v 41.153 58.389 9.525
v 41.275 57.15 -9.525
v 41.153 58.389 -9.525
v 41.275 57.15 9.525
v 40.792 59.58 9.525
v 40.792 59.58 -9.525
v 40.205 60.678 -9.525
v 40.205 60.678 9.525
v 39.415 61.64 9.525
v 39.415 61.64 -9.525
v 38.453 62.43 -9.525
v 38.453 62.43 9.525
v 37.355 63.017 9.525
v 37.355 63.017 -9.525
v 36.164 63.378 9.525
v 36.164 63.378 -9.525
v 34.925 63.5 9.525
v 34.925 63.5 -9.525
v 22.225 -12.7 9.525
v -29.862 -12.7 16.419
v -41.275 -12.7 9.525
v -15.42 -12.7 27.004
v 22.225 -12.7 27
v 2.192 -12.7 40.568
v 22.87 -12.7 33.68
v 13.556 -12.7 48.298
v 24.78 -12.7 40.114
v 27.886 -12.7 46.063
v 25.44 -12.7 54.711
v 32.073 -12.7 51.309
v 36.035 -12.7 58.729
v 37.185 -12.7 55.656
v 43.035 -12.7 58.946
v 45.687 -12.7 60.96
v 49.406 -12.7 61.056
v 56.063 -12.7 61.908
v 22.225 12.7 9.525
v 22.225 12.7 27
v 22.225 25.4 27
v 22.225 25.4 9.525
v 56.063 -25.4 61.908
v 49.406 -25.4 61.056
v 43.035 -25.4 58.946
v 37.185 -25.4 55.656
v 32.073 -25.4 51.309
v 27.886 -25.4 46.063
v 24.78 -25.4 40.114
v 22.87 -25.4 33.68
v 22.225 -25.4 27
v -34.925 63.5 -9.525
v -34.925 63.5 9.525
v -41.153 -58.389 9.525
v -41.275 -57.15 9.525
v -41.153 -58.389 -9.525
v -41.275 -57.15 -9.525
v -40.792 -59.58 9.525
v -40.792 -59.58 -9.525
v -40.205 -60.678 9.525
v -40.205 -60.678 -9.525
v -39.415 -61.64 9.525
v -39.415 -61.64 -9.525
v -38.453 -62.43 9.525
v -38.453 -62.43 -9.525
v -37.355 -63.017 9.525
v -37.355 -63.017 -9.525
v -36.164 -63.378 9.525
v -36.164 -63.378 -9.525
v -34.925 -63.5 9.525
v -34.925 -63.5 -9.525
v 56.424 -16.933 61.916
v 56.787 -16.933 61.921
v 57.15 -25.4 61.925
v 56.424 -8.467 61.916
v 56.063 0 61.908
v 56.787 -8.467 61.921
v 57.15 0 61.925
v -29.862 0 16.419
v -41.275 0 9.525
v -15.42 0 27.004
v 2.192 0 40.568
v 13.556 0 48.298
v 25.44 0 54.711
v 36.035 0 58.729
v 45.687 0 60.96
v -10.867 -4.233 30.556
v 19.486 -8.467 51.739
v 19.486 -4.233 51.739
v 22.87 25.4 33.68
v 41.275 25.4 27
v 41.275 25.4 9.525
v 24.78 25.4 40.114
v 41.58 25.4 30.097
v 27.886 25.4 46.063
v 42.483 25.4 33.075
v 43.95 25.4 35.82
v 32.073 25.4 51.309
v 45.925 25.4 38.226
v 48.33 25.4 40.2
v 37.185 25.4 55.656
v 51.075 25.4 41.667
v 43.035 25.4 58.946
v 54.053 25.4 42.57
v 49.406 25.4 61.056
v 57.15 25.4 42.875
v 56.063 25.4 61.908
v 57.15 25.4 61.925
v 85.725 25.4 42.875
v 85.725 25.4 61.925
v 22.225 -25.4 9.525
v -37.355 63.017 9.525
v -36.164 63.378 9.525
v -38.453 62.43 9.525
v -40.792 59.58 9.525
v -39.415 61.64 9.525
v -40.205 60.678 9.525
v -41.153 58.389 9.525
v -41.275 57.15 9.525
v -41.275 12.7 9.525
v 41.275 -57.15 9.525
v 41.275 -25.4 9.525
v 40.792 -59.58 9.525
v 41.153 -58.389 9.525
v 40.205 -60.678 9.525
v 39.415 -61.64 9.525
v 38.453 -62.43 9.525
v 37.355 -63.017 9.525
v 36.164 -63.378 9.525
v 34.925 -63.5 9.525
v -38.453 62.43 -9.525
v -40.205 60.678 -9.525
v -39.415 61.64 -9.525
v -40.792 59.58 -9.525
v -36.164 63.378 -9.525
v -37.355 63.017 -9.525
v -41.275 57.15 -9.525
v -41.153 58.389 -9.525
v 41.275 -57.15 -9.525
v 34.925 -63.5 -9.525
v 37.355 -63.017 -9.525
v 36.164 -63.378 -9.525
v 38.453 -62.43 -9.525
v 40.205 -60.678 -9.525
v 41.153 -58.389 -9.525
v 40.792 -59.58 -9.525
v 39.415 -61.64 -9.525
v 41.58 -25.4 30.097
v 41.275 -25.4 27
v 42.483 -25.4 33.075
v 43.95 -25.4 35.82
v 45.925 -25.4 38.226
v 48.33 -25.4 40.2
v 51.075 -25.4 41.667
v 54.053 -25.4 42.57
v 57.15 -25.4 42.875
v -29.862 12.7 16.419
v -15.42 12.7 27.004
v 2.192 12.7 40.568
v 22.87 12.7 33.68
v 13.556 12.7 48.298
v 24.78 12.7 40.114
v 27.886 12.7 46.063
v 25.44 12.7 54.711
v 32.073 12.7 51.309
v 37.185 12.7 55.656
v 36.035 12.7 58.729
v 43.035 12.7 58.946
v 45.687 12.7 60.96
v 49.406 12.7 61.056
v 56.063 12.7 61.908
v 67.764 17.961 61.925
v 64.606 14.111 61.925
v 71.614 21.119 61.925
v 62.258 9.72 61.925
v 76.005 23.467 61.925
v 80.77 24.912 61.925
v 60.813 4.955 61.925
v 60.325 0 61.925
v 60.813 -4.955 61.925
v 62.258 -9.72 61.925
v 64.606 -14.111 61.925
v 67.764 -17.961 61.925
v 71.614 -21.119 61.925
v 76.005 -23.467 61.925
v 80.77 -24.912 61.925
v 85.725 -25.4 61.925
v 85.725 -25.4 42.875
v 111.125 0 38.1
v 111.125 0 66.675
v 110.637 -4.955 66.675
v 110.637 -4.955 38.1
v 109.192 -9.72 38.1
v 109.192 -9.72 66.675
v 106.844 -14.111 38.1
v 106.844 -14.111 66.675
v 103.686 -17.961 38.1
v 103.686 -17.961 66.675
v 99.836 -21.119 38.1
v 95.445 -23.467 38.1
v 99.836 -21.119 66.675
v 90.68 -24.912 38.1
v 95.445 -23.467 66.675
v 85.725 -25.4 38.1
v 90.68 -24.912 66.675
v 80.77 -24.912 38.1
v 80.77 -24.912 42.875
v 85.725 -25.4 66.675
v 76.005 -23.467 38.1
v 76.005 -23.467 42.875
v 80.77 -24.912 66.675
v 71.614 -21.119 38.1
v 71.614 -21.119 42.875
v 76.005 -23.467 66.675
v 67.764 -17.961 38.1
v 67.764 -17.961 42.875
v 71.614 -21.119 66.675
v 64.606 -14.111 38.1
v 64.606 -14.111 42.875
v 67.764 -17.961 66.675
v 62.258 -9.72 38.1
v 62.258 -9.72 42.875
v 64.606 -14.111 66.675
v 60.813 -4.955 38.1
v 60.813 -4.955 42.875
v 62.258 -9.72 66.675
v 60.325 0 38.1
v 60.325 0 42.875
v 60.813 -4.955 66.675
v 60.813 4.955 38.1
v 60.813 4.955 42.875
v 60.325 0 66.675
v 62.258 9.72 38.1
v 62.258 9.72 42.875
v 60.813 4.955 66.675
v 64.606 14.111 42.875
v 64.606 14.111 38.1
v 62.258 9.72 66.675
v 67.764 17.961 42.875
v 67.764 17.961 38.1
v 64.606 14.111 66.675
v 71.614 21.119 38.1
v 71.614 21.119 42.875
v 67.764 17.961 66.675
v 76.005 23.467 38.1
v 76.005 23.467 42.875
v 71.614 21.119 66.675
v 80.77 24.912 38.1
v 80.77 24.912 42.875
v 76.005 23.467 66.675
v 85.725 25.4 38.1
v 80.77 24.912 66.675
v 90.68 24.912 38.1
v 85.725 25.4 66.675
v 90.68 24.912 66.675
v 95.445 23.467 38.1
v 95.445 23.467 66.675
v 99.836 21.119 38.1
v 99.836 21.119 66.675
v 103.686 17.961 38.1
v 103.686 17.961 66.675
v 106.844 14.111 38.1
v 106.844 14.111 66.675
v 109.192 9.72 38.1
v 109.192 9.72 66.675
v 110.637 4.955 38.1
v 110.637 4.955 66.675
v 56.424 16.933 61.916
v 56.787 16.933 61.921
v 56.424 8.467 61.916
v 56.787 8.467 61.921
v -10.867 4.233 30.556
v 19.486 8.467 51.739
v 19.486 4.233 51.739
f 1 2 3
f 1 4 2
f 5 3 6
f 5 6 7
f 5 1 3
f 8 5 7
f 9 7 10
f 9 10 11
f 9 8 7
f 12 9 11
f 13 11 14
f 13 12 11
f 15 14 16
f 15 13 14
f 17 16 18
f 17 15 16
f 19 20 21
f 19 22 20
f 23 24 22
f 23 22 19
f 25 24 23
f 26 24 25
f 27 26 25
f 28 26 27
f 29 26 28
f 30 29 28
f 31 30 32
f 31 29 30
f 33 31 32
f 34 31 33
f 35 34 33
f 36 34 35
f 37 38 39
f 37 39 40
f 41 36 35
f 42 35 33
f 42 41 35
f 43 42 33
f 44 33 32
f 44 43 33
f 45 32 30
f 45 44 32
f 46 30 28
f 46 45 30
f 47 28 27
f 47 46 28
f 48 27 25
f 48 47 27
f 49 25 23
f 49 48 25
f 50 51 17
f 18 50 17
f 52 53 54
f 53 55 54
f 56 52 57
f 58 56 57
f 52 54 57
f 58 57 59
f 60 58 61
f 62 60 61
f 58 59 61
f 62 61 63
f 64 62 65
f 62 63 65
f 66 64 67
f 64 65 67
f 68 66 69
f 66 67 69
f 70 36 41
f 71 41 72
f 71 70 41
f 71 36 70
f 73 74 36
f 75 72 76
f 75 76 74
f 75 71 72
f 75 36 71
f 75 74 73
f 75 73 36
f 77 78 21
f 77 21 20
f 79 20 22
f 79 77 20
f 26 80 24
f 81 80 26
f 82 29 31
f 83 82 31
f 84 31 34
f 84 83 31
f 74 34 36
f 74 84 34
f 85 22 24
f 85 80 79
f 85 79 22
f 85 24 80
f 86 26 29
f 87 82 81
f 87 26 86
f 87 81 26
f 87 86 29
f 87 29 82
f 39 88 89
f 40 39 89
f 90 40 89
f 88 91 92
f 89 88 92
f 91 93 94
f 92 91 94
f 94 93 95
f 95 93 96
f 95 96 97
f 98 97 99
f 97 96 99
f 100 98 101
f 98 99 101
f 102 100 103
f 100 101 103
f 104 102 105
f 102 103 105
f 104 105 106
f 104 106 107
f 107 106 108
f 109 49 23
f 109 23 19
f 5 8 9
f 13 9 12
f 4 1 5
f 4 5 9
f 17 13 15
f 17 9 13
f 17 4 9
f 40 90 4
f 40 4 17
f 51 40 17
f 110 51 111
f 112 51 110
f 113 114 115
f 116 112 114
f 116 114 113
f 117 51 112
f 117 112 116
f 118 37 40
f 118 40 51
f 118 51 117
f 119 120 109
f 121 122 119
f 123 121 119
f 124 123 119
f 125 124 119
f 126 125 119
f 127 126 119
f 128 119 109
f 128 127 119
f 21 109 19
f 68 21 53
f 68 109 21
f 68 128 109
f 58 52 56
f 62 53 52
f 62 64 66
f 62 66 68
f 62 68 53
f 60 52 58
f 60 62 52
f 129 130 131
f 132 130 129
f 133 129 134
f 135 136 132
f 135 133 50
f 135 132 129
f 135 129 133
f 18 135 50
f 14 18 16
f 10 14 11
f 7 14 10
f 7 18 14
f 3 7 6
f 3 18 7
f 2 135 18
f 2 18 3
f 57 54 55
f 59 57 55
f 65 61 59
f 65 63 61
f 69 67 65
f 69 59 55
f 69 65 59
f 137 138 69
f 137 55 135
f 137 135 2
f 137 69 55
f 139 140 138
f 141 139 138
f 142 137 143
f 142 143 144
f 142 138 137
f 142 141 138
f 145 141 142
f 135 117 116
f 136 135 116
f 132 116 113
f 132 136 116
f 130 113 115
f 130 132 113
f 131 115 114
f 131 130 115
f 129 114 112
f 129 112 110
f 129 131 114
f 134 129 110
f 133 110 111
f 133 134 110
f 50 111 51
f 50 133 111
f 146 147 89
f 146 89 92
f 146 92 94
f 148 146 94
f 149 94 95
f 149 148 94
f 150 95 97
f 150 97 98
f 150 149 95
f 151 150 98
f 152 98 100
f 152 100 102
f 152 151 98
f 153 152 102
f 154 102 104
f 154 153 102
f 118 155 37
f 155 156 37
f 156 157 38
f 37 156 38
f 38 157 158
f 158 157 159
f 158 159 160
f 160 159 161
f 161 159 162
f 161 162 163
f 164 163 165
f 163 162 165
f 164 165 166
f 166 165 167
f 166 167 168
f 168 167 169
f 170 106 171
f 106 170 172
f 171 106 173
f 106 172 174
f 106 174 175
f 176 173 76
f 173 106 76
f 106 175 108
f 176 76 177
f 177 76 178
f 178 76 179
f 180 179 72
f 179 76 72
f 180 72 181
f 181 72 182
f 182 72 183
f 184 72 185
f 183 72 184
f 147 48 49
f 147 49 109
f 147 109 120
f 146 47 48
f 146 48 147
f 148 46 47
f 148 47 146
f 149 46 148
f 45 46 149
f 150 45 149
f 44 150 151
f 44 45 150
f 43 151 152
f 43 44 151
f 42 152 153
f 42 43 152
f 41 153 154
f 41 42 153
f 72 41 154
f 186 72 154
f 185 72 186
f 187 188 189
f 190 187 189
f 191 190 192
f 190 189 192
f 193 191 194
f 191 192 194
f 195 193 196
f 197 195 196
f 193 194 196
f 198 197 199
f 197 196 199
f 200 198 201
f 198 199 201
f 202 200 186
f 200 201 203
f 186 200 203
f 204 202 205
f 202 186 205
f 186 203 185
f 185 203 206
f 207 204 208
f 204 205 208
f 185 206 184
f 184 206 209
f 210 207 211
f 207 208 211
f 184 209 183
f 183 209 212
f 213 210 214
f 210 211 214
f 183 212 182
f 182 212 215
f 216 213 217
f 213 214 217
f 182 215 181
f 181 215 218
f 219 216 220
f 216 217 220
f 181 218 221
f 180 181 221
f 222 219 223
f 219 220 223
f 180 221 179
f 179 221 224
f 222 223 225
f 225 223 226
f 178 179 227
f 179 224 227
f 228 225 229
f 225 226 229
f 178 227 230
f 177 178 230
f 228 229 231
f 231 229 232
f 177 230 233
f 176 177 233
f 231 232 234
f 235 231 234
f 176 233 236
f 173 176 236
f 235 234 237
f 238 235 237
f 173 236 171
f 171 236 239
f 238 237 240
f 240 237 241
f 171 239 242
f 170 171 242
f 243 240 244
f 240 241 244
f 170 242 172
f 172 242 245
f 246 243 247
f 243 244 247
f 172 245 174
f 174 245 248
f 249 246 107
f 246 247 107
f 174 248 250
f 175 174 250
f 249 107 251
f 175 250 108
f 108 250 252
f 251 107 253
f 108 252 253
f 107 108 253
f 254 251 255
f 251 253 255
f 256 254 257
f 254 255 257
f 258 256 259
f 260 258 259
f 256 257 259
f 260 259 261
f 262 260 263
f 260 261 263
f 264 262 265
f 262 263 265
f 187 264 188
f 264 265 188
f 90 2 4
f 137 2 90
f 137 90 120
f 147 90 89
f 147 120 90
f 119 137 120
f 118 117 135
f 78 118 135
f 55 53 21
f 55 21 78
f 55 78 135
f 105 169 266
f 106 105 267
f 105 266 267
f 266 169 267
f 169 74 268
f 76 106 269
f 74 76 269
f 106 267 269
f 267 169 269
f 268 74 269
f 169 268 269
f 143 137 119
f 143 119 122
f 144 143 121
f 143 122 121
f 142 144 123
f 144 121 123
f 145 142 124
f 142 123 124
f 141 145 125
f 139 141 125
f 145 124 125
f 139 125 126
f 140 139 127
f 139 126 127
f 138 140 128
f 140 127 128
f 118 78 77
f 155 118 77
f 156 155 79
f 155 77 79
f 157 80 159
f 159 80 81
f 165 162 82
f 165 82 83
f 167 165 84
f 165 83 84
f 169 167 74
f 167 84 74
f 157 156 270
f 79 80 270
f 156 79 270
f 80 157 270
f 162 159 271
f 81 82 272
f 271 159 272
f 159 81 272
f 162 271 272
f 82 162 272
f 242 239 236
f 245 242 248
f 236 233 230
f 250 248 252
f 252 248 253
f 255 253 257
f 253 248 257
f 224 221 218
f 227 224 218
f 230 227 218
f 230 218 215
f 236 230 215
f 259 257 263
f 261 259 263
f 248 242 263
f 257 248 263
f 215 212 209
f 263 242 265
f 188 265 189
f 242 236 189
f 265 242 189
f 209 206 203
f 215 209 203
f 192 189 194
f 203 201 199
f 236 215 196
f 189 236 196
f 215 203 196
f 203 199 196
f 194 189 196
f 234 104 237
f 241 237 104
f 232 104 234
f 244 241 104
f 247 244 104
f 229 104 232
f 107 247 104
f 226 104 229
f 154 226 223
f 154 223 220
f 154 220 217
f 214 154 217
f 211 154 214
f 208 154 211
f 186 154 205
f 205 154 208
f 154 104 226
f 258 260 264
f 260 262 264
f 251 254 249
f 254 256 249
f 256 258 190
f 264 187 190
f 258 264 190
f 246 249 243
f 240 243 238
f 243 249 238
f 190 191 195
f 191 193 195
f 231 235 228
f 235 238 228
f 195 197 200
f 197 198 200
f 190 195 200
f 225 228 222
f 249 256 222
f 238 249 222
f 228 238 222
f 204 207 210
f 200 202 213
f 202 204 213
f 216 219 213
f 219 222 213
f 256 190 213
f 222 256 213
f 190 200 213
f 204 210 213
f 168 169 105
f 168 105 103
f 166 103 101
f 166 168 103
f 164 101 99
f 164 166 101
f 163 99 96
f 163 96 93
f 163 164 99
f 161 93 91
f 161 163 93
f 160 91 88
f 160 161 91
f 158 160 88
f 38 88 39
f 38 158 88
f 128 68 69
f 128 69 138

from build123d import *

# Parameters (mm, degrees)
F1_DEPTH = 63.5
F2_DEPTH = 25.4
F3_DEPTH = 12.7
F0_W     = 25.4
F0_H     = 19.05
F4_DEPTH = 25.4
F6_R     = 6.35


with BuildPart() as f1:
    # F0 (on Front) → F1 (new body, symmetric)
    with BuildSketch(Plane.XZ):
        Polygon((41.275, -9.525), (41.275, 9.525), (22.225, 9.525), (-41.275, 9.525), (-41.275, -9.525), align=None)
    extrude(amount=F1_DEPTH, both=True)

    # F0 (on Front) → F2 (join, symmetric)
    with BuildSketch(Plane.XZ):
        with BuildLine():
            Line((22.225, 9.525), (41.275, 9.525))
            Line((41.275, 9.525), (41.275, 27.0002))
            ThreePointArc((41.275, 27.0002), (45.9246798487, 38.2255201513), (57.15, 42.8752))
            Line((57.15, 42.8752), (60.325, 42.8752))
            Line((60.325, 42.8752), (60.325, 61.9252))
            Line((60.325, 61.9252), (57.15, 61.9252))
            add(Edge.make_bspline(
                [(56.0630860739, 61.9082827763), (56.4239855427, 61.9164147912), (56.7862841158, 61.9220646594), (57.15, 61.9252)],
                knots=[110.5496251445, 110.5496251445, 110.5496251445, 110.5496251445, 111.5045361635, 111.5045361635, 111.5045361635, 111.5045361635], degree=3))
            ThreePointArc((56.0630860739, 61.9082827763), (32.0729577714, 51.3085849333), (22.225, 27.0002))
            Line((22.225, 27.0002), (22.225, 9.525))
        make_face()
    extrude(amount=F2_DEPTH, both=True)

    # F0 (on Front) → F3 (join, symmetric)
    with BuildSketch(Plane.XZ):
        with BuildLine():
            Line((-41.275, 9.525), (22.225, 9.525))
            Line((22.225, 9.525), (22.225, 27.0002))
            ThreePointArc((22.225, 27.0002), (32.0729577714, 51.3085849333), (56.0630860739, 61.9082827763))
            add(Edge.make_bspline(
                [(-41.275, 9.525), (-8.7476331645, 26.7582086028), (14.2819146452, 60.9668430208), (56.0630860739, 61.9082827763)],
                knots=[0, 0, 0, 0, 110.5496251445, 110.5496251445, 110.5496251445, 110.5496251445], degree=3))
        make_face()
    extrude(amount=F3_DEPTH, both=True)

    # F0 (on Front) → F4 (join, symmetric)
    with BuildSketch(Plane.XZ):
        with Locations((73.025, 52.4002)):
            Rectangle(F0_W, F0_H)
    extrude(amount=F4_DEPTH, both=True)

    # F0 (on Front) → F5 (revolve)
    with BuildSketch(Plane.XZ):
        Polygon((85.725, 61.9252), (85.725, 42.8752), (85.725, 38.1), (111.125, 38.1), (111.125, 66.675), (85.725, 66.675), align=None)
    revolve(axis=Axis((85.725, 0, 52.3875), (0, 0, -1)))

    # F6
    f6_edges = [f1.edges().sort_by_distance(p)[0] for p in [
        (41.275, -63.5, 0),
        (-41.275, -63.5, 0),
        (-41.275, 63.5, 0),
        (41.275, 63.5, 0),
    ]]
    fillet(f6_edges, radius=F6_R)


solid = f1.part
